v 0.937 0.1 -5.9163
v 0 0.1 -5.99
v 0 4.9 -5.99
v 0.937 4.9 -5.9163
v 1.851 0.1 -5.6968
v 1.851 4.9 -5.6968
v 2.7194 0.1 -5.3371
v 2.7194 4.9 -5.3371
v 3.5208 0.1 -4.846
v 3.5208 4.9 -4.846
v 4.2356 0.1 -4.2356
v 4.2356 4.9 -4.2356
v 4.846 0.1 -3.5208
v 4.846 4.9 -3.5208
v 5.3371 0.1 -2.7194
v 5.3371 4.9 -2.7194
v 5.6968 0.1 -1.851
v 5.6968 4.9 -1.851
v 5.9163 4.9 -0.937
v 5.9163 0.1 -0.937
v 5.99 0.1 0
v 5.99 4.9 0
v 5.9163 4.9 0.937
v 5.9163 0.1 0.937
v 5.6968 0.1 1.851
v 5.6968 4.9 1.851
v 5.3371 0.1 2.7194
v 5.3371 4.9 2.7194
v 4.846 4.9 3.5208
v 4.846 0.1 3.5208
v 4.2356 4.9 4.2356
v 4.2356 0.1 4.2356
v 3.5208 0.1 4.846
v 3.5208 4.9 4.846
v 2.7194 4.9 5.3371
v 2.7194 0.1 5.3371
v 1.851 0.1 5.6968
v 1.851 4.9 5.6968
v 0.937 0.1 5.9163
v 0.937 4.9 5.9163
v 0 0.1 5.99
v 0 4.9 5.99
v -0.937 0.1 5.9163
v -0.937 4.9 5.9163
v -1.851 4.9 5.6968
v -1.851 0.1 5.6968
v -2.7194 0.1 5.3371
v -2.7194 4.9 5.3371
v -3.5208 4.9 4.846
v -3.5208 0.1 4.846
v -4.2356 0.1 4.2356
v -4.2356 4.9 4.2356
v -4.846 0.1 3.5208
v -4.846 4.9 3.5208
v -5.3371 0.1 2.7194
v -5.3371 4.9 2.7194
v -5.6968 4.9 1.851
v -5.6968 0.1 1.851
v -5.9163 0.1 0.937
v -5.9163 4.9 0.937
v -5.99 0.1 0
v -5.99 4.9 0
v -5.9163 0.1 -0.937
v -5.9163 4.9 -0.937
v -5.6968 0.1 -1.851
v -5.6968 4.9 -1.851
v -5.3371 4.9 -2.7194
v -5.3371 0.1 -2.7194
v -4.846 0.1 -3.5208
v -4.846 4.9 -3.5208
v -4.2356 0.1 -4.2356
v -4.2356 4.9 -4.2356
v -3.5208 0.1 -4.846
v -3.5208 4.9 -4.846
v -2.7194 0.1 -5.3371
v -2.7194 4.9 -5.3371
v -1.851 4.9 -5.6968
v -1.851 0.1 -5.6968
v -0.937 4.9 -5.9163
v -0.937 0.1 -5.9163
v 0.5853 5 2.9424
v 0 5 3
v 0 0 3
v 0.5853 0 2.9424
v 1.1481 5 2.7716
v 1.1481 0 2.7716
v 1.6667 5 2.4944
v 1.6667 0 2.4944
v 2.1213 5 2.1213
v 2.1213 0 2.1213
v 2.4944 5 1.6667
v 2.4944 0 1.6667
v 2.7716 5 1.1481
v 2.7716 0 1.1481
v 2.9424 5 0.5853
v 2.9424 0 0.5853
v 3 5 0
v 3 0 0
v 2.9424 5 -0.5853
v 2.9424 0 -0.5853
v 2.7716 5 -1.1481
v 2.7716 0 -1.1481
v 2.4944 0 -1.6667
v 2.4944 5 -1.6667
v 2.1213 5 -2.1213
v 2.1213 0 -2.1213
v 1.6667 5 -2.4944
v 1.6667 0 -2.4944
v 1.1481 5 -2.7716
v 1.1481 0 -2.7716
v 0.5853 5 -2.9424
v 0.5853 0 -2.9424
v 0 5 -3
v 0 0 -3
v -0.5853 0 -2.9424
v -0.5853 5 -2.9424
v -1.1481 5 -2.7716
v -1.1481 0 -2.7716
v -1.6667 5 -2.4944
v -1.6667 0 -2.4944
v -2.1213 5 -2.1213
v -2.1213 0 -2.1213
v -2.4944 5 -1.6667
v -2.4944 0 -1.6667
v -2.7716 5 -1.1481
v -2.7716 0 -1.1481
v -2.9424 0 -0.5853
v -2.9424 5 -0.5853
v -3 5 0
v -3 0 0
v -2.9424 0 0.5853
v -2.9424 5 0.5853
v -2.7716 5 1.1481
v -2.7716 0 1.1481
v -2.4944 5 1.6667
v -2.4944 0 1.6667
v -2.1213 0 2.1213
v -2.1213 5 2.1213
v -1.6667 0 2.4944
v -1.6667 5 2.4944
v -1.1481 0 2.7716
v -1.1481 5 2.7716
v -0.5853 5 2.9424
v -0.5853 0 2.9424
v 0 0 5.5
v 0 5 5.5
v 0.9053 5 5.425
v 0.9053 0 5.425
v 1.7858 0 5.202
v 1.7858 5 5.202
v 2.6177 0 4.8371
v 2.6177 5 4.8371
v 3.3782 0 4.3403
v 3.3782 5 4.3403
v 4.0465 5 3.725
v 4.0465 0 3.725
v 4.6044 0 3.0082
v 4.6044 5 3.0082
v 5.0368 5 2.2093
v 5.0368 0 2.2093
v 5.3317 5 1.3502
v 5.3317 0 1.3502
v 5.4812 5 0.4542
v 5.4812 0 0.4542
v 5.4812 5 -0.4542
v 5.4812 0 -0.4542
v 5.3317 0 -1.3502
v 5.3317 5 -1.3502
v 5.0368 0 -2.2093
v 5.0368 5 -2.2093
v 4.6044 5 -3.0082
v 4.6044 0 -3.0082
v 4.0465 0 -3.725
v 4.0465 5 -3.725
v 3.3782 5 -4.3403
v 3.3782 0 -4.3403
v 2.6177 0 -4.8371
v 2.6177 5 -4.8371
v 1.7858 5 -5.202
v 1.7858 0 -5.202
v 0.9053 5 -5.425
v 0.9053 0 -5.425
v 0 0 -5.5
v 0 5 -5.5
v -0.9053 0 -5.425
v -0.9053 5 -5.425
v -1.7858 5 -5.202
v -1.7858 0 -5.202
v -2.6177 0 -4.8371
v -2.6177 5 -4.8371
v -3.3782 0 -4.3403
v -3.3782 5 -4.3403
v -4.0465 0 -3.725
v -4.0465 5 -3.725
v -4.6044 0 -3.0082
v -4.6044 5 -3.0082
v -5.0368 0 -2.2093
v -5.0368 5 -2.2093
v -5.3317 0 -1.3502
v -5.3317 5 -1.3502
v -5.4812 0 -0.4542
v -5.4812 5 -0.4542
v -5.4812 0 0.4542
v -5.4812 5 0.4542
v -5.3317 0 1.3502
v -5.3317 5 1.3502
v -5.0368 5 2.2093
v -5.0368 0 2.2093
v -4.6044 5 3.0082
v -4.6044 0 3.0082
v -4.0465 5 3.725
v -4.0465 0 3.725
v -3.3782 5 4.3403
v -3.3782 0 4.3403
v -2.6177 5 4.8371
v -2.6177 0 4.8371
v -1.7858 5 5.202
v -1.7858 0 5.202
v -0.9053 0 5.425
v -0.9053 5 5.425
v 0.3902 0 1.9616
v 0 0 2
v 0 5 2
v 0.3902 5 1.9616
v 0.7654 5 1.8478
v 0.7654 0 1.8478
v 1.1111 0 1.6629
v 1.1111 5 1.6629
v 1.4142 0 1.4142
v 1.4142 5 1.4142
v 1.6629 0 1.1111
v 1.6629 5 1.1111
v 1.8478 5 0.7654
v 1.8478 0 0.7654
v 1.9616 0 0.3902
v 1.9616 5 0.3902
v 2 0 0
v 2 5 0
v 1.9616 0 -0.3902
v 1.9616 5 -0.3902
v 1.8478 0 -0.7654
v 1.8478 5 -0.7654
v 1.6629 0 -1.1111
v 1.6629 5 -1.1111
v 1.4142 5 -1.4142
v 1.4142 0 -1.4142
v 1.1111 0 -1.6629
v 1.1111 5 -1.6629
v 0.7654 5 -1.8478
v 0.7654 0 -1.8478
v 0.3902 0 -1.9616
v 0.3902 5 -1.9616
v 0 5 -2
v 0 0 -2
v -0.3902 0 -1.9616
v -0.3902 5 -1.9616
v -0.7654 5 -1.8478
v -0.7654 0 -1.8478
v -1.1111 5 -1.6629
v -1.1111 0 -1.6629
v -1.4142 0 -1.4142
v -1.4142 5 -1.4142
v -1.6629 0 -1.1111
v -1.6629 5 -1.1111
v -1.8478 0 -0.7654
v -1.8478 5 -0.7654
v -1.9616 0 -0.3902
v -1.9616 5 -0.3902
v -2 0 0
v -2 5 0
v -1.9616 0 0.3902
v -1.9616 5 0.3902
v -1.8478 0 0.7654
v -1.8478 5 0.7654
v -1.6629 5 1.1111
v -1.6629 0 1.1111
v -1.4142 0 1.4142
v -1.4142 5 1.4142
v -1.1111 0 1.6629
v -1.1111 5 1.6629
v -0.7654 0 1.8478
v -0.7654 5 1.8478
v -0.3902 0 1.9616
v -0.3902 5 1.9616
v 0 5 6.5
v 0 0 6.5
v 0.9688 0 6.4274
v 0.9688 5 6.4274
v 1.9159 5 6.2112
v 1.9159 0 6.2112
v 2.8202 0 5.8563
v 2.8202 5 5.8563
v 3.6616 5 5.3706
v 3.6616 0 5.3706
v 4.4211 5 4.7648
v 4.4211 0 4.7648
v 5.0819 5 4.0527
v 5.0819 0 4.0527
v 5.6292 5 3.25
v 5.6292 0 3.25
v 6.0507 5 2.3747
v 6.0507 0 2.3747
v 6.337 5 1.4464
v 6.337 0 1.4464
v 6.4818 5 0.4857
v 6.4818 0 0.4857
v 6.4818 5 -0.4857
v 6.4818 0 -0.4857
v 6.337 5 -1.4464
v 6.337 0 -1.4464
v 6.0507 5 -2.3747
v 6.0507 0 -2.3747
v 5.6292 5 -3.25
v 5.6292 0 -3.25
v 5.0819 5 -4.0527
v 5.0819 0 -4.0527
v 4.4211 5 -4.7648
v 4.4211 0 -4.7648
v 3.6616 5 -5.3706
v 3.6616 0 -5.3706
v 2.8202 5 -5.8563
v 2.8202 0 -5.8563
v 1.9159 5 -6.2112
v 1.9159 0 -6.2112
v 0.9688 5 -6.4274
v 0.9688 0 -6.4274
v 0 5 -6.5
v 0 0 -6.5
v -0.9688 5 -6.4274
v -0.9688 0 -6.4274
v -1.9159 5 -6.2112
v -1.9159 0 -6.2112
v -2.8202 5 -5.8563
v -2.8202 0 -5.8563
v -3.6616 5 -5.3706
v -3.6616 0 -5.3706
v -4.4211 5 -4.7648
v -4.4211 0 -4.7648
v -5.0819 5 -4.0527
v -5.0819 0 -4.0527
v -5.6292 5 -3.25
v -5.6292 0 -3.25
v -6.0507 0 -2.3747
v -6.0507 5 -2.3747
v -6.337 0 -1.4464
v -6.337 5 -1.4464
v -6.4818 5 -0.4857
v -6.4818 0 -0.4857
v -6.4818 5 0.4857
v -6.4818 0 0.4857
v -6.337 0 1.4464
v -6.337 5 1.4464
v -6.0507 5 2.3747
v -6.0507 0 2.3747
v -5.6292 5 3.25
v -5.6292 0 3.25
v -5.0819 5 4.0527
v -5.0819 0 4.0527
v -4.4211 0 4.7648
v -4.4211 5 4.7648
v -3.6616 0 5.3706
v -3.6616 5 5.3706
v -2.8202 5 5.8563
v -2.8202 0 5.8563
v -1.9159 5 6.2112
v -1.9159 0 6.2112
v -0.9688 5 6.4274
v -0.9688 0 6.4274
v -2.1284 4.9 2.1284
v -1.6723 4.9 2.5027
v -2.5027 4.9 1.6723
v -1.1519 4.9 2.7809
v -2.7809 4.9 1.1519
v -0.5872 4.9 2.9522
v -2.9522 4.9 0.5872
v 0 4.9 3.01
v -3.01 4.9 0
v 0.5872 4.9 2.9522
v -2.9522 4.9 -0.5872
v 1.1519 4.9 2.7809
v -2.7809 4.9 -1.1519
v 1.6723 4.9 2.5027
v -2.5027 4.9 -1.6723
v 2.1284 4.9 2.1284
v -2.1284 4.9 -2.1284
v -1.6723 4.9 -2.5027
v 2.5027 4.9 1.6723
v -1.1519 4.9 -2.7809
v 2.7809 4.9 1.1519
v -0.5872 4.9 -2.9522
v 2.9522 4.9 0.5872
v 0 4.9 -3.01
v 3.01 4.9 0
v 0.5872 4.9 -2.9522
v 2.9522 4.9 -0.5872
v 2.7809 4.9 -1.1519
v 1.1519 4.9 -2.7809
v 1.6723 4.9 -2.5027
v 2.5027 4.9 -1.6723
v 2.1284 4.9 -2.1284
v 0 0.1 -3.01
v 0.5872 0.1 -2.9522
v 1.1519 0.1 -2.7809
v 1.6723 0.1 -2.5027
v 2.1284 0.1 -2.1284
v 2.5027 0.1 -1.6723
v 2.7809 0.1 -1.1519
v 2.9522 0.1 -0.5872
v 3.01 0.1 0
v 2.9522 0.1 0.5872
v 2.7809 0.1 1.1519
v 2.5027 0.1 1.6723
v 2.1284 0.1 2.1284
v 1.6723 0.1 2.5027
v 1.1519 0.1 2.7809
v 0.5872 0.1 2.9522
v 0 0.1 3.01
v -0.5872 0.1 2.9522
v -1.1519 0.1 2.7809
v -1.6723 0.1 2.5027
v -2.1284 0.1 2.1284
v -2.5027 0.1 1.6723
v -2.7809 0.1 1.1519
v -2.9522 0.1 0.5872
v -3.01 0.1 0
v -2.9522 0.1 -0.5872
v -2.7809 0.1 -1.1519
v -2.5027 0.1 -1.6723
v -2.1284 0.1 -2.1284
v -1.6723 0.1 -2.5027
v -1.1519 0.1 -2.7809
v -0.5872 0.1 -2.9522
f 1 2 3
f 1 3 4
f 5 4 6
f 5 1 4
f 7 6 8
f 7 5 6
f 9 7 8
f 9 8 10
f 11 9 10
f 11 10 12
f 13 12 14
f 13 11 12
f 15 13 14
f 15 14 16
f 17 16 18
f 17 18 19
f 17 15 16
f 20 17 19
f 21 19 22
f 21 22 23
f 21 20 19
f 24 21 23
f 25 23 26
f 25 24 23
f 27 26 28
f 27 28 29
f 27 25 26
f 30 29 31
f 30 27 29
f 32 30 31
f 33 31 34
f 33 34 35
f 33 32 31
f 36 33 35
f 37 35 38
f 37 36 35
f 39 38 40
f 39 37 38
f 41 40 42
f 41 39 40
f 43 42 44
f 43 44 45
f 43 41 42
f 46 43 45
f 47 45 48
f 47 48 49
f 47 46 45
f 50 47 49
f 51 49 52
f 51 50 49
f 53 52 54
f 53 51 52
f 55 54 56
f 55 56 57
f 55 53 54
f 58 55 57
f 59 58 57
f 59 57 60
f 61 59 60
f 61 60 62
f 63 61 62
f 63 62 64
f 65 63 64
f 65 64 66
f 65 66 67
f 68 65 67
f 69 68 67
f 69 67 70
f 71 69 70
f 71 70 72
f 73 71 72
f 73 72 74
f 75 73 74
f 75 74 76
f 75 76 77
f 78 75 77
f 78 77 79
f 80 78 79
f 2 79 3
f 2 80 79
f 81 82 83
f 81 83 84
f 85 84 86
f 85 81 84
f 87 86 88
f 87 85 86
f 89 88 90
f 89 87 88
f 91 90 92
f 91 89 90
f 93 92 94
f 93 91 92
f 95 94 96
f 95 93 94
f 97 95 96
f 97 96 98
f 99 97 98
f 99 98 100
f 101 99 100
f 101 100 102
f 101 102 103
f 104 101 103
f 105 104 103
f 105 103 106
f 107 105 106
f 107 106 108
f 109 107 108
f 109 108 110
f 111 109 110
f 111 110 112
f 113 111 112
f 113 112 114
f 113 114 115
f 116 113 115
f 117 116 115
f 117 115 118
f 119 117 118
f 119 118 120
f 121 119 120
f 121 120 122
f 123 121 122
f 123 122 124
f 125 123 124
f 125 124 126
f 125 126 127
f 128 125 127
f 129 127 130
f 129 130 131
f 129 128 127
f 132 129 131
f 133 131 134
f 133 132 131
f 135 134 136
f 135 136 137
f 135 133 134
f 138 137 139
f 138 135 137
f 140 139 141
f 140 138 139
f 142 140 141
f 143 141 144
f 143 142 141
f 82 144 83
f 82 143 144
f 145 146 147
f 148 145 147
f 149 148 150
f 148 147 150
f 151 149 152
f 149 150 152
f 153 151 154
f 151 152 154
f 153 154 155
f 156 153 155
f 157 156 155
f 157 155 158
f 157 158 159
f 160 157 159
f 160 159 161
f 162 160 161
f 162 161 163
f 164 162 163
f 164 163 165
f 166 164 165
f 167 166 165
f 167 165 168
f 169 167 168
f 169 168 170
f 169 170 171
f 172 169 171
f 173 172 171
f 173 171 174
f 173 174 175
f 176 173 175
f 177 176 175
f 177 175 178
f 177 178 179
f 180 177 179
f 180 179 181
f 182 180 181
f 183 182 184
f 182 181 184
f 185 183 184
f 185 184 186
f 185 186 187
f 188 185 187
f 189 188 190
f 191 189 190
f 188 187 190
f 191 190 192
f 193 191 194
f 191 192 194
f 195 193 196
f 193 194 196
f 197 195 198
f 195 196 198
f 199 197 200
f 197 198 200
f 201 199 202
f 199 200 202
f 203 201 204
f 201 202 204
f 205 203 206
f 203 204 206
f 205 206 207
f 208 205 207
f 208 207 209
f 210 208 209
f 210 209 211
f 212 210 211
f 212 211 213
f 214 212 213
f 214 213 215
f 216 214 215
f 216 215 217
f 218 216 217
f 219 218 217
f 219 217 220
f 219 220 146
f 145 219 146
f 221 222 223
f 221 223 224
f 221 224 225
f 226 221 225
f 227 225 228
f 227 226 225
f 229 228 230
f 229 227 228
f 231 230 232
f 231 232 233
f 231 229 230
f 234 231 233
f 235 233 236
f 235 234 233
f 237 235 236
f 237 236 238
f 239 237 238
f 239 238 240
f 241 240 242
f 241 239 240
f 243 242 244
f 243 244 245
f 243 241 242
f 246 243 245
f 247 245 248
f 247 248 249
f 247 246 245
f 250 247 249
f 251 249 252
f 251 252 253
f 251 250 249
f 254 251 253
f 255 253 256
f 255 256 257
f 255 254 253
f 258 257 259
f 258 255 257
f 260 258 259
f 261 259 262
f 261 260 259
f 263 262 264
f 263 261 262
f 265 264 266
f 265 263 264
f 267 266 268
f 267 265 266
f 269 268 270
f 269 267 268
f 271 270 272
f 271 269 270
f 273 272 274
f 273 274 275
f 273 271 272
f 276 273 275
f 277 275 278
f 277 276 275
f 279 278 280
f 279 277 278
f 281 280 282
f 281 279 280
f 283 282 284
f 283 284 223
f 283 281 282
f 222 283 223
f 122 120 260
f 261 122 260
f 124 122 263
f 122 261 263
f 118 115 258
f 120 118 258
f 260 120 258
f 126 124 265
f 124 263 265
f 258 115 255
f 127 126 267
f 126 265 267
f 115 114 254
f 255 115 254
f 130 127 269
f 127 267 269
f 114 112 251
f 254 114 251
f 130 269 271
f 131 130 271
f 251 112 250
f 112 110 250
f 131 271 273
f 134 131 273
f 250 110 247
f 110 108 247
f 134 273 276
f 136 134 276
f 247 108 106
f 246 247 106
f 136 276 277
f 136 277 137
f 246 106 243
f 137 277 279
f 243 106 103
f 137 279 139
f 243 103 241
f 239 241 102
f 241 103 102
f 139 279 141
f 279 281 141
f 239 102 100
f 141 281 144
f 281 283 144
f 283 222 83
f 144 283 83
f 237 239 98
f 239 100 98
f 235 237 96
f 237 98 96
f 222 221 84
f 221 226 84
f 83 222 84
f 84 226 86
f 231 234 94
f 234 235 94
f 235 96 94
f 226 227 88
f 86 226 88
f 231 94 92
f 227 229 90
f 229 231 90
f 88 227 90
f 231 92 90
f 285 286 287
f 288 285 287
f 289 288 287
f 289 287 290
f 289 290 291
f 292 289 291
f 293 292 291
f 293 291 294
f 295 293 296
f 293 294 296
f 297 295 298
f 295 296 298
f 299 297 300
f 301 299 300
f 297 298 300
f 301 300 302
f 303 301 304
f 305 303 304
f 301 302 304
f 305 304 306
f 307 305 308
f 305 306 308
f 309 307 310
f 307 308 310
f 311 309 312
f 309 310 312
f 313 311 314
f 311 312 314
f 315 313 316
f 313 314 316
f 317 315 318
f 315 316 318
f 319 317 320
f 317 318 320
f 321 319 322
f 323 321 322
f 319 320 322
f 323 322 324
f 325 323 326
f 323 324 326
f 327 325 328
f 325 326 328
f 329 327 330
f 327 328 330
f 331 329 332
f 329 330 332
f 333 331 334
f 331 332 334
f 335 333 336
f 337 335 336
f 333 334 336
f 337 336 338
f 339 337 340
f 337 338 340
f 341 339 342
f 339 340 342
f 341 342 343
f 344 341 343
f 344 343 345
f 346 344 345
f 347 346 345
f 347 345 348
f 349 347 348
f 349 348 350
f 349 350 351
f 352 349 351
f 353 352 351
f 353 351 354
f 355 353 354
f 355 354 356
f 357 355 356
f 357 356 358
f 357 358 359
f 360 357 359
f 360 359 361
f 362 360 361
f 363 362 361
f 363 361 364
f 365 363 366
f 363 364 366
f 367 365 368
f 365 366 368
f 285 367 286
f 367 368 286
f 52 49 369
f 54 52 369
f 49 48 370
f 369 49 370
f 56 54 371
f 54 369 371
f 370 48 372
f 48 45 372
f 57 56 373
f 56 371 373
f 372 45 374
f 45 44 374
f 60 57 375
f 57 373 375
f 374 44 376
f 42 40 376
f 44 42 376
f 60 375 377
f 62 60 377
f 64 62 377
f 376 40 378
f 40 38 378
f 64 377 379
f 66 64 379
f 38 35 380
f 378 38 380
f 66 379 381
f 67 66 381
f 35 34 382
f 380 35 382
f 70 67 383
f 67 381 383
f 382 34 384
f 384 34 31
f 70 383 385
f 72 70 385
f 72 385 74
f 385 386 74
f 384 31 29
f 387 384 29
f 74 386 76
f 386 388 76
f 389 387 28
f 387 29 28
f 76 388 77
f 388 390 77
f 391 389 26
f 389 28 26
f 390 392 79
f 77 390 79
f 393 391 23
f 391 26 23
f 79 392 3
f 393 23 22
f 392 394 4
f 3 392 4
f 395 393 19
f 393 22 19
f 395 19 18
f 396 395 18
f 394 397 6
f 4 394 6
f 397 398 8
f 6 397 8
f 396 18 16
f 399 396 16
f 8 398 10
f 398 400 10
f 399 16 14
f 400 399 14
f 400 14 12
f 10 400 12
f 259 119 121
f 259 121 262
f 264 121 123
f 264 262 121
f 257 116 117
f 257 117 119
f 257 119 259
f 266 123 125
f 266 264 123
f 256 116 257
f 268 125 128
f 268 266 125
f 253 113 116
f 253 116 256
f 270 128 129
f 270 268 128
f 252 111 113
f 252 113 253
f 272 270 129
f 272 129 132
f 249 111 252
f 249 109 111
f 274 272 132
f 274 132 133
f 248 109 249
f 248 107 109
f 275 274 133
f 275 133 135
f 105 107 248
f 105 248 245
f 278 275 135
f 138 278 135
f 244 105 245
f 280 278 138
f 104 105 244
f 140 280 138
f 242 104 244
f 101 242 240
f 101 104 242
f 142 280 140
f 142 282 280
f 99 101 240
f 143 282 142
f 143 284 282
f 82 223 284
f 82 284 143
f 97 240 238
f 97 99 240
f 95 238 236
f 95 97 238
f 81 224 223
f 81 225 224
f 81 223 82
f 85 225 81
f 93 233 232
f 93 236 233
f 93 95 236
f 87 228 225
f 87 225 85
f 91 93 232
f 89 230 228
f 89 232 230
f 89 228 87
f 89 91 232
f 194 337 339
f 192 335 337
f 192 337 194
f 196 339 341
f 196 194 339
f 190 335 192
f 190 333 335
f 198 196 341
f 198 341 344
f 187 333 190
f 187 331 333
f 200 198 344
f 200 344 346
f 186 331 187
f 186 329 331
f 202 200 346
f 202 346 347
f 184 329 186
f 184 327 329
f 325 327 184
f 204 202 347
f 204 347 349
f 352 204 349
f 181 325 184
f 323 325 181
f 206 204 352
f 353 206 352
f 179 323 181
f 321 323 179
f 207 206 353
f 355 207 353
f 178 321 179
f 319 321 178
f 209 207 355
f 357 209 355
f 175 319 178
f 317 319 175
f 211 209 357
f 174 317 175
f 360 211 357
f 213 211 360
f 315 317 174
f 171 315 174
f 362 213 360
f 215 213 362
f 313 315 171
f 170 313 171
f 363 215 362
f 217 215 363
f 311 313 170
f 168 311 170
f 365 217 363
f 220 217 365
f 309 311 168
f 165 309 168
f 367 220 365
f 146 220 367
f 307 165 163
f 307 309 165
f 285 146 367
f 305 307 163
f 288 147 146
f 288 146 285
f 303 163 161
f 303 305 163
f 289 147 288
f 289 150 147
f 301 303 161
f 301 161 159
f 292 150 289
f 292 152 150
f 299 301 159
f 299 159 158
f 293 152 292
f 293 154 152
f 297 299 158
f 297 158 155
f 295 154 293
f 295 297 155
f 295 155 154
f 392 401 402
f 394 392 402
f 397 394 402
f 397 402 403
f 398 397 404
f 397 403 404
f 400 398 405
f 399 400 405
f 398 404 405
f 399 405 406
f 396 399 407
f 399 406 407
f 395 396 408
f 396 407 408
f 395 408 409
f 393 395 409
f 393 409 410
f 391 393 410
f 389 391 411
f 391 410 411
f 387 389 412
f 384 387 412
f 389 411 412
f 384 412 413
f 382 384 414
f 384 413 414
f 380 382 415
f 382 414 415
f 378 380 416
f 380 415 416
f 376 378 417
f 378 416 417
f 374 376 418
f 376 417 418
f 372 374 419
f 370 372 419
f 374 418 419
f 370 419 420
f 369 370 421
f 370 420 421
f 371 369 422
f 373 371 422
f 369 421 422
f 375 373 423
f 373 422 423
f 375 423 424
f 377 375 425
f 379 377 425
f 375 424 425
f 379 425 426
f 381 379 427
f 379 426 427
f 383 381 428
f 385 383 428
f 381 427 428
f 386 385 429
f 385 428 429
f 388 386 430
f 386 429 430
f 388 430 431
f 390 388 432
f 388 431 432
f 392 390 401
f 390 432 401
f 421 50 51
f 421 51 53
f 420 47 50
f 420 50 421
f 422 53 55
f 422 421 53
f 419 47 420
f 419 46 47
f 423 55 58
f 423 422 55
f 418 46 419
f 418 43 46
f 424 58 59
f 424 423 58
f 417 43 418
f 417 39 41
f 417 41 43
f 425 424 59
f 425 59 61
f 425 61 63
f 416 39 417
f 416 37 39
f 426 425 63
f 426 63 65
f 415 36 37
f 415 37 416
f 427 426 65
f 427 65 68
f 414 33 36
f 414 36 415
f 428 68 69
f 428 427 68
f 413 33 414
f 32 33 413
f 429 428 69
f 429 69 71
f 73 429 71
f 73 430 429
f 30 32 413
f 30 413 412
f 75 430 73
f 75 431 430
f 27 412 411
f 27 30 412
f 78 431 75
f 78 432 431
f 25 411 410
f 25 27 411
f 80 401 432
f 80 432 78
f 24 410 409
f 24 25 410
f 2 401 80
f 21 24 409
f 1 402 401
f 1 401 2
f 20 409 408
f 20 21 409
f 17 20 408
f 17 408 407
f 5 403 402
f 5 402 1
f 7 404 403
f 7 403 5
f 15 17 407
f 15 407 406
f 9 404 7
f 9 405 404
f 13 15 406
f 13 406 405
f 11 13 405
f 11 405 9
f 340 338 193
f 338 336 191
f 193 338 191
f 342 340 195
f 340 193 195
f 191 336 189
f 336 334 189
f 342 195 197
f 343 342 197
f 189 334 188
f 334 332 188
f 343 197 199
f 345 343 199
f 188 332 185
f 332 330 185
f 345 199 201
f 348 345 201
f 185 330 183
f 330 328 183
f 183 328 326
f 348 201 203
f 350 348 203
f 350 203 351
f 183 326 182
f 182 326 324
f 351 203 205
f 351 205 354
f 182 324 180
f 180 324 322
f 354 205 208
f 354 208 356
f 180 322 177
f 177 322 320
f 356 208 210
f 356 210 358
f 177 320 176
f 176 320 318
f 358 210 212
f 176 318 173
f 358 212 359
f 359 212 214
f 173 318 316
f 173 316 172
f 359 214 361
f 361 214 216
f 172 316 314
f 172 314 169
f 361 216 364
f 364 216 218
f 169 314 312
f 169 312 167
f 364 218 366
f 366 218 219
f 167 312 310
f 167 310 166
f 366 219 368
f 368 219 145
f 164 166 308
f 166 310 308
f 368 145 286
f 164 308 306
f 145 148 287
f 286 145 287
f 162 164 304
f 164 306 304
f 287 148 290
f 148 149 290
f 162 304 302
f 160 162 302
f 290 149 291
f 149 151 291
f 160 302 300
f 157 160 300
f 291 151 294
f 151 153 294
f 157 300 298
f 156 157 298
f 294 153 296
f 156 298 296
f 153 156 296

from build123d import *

# Parameters (mm, degrees)
SKETCH1_R           = 6.5
SKETCH1_R_2         = 2
BOSS_EXTRUDE1_DEPTH = 5
CUT_EXTRUDE1_REACH  = 12.464
SKETCH2_R           = 5.5
SKETCH2_R_2         = 3
BOSS_EXTRUDE2_START = -0.1
SKETCH4_R           = 5.99
SKETCH4_R_2         = 3.01
BOSS_EXTRUDE2_DEPTH = 4.8


with BuildPart() as part:
    # Sketch1 → Boss-Extrude1 (new body)
    with BuildSketch(Plane(origin=(0, 0, 0), x_dir=(1, 0, 0), z_dir=(0, 1, 0))):
        with Locations(Location((0, 0, 0), (0, 0, 270))):
            Circle(SKETCH1_R)
        with Locations(Location((0, 0, 0), (0, 0, 270))):
            Circle(SKETCH1_R_2, mode=Mode.SUBTRACT)
    extrude(amount=BOSS_EXTRUDE1_DEPTH)

    # Sketch2 → Cut-Extrude1 (cut, up to next)
    with BuildSketch(Plane(origin=(0, 5, 0), x_dir=(1, 0, 0), z_dir=(0, 1, 0)), mode=Mode.PRIVATE) as cut_extrude1_sk1:
        with Locations(Location((0, 0, 0), (0, 0, 270))):
            Circle(SKETCH2_R)
        with Locations(Location((0, 0, 0), (0, 0, 270))):
            Circle(SKETCH2_R_2, mode=Mode.SUBTRACT)
    cut_extrude1_tool1 = extrude(cut_extrude1_sk1.sketch, amount=-CUT_EXTRUDE1_REACH, mode=Mode.PRIVATE) & part.part
    add(cut_extrude1_tool1.solids().sort_by_distance((0, 5, -5.344437))[0], mode=Mode.SUBTRACT)


with BuildPart() as cut_extrude1_piece_1:
    # of the separate pieces the step leaves, piece 1, a body of its own (cut_extrude1_pieces)
    add(part.part.solids().sort_by_distance((0, 0, 6.5))[0])


with BuildPart() as cut_extrude1_piece_2:
    # of the separate pieces the step leaves, piece 2, a body of its own (cut_extrude1_pieces)
    add(part.part.solids().sort_by_distance((0, 0, 3))[0])


with BuildPart() as body_3:
    # Sketch4 → Boss-Extrude2 (new body)
    with BuildSketch(Plane.XZ.offset(BOSS_EXTRUDE2_START)):
        with Locations(Location((0, 0, 0), (0, 0, 270))):
            Circle(SKETCH4_R)
        with Locations(Location((0, 0, 0), (0, 0, 270))):
            Circle(SKETCH4_R_2, mode=Mode.SUBTRACT)
    extrude(amount=-BOSS_EXTRUDE2_DEPTH)


solid = Compound([cut_extrude1_piece_1.part, cut_extrude1_piece_2.part, body_3.part])
